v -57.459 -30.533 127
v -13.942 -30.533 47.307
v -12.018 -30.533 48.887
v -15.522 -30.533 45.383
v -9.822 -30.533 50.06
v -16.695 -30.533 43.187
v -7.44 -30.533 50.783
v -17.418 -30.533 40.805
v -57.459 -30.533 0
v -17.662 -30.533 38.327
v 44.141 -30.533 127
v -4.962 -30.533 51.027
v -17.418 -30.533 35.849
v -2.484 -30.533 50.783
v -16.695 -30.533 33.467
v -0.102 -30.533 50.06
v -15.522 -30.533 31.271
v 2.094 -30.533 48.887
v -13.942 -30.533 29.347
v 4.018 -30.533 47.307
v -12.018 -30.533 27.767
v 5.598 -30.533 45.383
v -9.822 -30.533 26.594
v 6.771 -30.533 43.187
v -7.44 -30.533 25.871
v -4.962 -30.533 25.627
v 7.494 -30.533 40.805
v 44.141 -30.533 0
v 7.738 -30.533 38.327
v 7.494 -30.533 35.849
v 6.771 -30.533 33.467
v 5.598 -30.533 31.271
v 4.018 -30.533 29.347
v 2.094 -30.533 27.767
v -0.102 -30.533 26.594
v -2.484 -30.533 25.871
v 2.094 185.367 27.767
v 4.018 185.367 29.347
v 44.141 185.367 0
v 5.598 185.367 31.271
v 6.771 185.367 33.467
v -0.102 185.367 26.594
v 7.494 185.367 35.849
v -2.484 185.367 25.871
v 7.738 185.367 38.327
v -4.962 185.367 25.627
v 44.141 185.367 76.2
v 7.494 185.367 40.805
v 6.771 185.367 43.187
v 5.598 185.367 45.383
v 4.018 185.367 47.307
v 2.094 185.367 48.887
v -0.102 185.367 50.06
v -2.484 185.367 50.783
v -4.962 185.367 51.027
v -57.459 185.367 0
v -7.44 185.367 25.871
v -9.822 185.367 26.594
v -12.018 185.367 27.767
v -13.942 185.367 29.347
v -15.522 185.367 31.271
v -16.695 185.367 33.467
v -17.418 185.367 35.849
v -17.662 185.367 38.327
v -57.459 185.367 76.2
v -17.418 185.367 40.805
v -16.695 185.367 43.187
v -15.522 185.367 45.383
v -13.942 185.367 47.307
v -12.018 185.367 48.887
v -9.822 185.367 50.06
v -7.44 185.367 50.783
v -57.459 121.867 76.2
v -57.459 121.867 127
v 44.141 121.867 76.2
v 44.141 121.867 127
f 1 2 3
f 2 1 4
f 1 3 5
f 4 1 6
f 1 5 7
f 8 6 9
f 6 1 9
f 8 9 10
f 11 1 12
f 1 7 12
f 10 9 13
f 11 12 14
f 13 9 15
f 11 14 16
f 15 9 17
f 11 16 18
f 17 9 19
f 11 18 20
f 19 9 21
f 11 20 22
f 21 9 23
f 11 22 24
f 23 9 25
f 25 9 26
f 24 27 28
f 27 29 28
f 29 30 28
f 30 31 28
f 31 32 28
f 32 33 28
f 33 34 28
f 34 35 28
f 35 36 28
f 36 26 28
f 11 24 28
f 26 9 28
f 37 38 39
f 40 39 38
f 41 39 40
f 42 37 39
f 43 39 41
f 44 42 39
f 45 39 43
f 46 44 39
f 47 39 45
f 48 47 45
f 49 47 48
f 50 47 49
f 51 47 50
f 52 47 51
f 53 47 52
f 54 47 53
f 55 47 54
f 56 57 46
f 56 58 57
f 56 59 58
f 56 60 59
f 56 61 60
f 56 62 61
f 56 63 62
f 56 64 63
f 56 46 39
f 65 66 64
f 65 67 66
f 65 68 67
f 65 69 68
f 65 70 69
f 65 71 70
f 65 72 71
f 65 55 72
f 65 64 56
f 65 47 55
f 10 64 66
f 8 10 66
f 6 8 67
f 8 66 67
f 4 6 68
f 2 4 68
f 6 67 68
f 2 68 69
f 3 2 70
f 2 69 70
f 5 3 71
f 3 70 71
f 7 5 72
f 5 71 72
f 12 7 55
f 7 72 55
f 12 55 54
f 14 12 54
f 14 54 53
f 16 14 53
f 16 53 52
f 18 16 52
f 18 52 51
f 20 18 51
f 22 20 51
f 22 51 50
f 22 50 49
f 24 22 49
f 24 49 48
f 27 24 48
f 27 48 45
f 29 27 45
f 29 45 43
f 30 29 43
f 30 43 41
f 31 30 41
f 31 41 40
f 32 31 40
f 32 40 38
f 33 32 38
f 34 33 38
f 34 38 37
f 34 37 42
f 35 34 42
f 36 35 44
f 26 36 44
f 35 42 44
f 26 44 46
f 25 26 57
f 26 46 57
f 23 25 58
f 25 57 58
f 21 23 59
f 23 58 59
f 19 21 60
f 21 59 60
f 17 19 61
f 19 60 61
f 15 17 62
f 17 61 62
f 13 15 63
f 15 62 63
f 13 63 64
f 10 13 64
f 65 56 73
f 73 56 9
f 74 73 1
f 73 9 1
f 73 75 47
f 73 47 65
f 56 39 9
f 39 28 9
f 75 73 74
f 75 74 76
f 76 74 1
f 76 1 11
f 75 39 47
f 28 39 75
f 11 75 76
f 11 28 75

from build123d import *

# Parameters (mm, degrees)
F0_W     = 101.6
F0_H     = 152.4
F1_DEPTH = 127
F4_W     = 101.6
F4_H     = 76.2
F5_DEPTH = 63.5
F6_D     = 25.4


with BuildPart() as f1:
    # F0 (on Top) → F1 (new body)
    with BuildSketch(Plane.XY):
        with Locations((-6.65934, 45.666524)):
            Rectangle(F0_W, F0_H)
    extrude(amount=F1_DEPTH)

    # F4 (on face) → F5 (join)
    with BuildSketch(Plane(origin=(0, 121.866524, 0), x_dir=(-1, 0, 0), z_dir=(0, 1, 0))):
        with Locations((6.65934, 38.1)):
            Rectangle(F4_W, F4_H)
    extrude(amount=F5_DEPTH)

    # F6 (through all)
    with Locations(Plane.XZ.offset(30.533476)):
        with Locations((-4.961859, 38.326953)):
            Hole(F6_D / 2)


solid = f1.part
